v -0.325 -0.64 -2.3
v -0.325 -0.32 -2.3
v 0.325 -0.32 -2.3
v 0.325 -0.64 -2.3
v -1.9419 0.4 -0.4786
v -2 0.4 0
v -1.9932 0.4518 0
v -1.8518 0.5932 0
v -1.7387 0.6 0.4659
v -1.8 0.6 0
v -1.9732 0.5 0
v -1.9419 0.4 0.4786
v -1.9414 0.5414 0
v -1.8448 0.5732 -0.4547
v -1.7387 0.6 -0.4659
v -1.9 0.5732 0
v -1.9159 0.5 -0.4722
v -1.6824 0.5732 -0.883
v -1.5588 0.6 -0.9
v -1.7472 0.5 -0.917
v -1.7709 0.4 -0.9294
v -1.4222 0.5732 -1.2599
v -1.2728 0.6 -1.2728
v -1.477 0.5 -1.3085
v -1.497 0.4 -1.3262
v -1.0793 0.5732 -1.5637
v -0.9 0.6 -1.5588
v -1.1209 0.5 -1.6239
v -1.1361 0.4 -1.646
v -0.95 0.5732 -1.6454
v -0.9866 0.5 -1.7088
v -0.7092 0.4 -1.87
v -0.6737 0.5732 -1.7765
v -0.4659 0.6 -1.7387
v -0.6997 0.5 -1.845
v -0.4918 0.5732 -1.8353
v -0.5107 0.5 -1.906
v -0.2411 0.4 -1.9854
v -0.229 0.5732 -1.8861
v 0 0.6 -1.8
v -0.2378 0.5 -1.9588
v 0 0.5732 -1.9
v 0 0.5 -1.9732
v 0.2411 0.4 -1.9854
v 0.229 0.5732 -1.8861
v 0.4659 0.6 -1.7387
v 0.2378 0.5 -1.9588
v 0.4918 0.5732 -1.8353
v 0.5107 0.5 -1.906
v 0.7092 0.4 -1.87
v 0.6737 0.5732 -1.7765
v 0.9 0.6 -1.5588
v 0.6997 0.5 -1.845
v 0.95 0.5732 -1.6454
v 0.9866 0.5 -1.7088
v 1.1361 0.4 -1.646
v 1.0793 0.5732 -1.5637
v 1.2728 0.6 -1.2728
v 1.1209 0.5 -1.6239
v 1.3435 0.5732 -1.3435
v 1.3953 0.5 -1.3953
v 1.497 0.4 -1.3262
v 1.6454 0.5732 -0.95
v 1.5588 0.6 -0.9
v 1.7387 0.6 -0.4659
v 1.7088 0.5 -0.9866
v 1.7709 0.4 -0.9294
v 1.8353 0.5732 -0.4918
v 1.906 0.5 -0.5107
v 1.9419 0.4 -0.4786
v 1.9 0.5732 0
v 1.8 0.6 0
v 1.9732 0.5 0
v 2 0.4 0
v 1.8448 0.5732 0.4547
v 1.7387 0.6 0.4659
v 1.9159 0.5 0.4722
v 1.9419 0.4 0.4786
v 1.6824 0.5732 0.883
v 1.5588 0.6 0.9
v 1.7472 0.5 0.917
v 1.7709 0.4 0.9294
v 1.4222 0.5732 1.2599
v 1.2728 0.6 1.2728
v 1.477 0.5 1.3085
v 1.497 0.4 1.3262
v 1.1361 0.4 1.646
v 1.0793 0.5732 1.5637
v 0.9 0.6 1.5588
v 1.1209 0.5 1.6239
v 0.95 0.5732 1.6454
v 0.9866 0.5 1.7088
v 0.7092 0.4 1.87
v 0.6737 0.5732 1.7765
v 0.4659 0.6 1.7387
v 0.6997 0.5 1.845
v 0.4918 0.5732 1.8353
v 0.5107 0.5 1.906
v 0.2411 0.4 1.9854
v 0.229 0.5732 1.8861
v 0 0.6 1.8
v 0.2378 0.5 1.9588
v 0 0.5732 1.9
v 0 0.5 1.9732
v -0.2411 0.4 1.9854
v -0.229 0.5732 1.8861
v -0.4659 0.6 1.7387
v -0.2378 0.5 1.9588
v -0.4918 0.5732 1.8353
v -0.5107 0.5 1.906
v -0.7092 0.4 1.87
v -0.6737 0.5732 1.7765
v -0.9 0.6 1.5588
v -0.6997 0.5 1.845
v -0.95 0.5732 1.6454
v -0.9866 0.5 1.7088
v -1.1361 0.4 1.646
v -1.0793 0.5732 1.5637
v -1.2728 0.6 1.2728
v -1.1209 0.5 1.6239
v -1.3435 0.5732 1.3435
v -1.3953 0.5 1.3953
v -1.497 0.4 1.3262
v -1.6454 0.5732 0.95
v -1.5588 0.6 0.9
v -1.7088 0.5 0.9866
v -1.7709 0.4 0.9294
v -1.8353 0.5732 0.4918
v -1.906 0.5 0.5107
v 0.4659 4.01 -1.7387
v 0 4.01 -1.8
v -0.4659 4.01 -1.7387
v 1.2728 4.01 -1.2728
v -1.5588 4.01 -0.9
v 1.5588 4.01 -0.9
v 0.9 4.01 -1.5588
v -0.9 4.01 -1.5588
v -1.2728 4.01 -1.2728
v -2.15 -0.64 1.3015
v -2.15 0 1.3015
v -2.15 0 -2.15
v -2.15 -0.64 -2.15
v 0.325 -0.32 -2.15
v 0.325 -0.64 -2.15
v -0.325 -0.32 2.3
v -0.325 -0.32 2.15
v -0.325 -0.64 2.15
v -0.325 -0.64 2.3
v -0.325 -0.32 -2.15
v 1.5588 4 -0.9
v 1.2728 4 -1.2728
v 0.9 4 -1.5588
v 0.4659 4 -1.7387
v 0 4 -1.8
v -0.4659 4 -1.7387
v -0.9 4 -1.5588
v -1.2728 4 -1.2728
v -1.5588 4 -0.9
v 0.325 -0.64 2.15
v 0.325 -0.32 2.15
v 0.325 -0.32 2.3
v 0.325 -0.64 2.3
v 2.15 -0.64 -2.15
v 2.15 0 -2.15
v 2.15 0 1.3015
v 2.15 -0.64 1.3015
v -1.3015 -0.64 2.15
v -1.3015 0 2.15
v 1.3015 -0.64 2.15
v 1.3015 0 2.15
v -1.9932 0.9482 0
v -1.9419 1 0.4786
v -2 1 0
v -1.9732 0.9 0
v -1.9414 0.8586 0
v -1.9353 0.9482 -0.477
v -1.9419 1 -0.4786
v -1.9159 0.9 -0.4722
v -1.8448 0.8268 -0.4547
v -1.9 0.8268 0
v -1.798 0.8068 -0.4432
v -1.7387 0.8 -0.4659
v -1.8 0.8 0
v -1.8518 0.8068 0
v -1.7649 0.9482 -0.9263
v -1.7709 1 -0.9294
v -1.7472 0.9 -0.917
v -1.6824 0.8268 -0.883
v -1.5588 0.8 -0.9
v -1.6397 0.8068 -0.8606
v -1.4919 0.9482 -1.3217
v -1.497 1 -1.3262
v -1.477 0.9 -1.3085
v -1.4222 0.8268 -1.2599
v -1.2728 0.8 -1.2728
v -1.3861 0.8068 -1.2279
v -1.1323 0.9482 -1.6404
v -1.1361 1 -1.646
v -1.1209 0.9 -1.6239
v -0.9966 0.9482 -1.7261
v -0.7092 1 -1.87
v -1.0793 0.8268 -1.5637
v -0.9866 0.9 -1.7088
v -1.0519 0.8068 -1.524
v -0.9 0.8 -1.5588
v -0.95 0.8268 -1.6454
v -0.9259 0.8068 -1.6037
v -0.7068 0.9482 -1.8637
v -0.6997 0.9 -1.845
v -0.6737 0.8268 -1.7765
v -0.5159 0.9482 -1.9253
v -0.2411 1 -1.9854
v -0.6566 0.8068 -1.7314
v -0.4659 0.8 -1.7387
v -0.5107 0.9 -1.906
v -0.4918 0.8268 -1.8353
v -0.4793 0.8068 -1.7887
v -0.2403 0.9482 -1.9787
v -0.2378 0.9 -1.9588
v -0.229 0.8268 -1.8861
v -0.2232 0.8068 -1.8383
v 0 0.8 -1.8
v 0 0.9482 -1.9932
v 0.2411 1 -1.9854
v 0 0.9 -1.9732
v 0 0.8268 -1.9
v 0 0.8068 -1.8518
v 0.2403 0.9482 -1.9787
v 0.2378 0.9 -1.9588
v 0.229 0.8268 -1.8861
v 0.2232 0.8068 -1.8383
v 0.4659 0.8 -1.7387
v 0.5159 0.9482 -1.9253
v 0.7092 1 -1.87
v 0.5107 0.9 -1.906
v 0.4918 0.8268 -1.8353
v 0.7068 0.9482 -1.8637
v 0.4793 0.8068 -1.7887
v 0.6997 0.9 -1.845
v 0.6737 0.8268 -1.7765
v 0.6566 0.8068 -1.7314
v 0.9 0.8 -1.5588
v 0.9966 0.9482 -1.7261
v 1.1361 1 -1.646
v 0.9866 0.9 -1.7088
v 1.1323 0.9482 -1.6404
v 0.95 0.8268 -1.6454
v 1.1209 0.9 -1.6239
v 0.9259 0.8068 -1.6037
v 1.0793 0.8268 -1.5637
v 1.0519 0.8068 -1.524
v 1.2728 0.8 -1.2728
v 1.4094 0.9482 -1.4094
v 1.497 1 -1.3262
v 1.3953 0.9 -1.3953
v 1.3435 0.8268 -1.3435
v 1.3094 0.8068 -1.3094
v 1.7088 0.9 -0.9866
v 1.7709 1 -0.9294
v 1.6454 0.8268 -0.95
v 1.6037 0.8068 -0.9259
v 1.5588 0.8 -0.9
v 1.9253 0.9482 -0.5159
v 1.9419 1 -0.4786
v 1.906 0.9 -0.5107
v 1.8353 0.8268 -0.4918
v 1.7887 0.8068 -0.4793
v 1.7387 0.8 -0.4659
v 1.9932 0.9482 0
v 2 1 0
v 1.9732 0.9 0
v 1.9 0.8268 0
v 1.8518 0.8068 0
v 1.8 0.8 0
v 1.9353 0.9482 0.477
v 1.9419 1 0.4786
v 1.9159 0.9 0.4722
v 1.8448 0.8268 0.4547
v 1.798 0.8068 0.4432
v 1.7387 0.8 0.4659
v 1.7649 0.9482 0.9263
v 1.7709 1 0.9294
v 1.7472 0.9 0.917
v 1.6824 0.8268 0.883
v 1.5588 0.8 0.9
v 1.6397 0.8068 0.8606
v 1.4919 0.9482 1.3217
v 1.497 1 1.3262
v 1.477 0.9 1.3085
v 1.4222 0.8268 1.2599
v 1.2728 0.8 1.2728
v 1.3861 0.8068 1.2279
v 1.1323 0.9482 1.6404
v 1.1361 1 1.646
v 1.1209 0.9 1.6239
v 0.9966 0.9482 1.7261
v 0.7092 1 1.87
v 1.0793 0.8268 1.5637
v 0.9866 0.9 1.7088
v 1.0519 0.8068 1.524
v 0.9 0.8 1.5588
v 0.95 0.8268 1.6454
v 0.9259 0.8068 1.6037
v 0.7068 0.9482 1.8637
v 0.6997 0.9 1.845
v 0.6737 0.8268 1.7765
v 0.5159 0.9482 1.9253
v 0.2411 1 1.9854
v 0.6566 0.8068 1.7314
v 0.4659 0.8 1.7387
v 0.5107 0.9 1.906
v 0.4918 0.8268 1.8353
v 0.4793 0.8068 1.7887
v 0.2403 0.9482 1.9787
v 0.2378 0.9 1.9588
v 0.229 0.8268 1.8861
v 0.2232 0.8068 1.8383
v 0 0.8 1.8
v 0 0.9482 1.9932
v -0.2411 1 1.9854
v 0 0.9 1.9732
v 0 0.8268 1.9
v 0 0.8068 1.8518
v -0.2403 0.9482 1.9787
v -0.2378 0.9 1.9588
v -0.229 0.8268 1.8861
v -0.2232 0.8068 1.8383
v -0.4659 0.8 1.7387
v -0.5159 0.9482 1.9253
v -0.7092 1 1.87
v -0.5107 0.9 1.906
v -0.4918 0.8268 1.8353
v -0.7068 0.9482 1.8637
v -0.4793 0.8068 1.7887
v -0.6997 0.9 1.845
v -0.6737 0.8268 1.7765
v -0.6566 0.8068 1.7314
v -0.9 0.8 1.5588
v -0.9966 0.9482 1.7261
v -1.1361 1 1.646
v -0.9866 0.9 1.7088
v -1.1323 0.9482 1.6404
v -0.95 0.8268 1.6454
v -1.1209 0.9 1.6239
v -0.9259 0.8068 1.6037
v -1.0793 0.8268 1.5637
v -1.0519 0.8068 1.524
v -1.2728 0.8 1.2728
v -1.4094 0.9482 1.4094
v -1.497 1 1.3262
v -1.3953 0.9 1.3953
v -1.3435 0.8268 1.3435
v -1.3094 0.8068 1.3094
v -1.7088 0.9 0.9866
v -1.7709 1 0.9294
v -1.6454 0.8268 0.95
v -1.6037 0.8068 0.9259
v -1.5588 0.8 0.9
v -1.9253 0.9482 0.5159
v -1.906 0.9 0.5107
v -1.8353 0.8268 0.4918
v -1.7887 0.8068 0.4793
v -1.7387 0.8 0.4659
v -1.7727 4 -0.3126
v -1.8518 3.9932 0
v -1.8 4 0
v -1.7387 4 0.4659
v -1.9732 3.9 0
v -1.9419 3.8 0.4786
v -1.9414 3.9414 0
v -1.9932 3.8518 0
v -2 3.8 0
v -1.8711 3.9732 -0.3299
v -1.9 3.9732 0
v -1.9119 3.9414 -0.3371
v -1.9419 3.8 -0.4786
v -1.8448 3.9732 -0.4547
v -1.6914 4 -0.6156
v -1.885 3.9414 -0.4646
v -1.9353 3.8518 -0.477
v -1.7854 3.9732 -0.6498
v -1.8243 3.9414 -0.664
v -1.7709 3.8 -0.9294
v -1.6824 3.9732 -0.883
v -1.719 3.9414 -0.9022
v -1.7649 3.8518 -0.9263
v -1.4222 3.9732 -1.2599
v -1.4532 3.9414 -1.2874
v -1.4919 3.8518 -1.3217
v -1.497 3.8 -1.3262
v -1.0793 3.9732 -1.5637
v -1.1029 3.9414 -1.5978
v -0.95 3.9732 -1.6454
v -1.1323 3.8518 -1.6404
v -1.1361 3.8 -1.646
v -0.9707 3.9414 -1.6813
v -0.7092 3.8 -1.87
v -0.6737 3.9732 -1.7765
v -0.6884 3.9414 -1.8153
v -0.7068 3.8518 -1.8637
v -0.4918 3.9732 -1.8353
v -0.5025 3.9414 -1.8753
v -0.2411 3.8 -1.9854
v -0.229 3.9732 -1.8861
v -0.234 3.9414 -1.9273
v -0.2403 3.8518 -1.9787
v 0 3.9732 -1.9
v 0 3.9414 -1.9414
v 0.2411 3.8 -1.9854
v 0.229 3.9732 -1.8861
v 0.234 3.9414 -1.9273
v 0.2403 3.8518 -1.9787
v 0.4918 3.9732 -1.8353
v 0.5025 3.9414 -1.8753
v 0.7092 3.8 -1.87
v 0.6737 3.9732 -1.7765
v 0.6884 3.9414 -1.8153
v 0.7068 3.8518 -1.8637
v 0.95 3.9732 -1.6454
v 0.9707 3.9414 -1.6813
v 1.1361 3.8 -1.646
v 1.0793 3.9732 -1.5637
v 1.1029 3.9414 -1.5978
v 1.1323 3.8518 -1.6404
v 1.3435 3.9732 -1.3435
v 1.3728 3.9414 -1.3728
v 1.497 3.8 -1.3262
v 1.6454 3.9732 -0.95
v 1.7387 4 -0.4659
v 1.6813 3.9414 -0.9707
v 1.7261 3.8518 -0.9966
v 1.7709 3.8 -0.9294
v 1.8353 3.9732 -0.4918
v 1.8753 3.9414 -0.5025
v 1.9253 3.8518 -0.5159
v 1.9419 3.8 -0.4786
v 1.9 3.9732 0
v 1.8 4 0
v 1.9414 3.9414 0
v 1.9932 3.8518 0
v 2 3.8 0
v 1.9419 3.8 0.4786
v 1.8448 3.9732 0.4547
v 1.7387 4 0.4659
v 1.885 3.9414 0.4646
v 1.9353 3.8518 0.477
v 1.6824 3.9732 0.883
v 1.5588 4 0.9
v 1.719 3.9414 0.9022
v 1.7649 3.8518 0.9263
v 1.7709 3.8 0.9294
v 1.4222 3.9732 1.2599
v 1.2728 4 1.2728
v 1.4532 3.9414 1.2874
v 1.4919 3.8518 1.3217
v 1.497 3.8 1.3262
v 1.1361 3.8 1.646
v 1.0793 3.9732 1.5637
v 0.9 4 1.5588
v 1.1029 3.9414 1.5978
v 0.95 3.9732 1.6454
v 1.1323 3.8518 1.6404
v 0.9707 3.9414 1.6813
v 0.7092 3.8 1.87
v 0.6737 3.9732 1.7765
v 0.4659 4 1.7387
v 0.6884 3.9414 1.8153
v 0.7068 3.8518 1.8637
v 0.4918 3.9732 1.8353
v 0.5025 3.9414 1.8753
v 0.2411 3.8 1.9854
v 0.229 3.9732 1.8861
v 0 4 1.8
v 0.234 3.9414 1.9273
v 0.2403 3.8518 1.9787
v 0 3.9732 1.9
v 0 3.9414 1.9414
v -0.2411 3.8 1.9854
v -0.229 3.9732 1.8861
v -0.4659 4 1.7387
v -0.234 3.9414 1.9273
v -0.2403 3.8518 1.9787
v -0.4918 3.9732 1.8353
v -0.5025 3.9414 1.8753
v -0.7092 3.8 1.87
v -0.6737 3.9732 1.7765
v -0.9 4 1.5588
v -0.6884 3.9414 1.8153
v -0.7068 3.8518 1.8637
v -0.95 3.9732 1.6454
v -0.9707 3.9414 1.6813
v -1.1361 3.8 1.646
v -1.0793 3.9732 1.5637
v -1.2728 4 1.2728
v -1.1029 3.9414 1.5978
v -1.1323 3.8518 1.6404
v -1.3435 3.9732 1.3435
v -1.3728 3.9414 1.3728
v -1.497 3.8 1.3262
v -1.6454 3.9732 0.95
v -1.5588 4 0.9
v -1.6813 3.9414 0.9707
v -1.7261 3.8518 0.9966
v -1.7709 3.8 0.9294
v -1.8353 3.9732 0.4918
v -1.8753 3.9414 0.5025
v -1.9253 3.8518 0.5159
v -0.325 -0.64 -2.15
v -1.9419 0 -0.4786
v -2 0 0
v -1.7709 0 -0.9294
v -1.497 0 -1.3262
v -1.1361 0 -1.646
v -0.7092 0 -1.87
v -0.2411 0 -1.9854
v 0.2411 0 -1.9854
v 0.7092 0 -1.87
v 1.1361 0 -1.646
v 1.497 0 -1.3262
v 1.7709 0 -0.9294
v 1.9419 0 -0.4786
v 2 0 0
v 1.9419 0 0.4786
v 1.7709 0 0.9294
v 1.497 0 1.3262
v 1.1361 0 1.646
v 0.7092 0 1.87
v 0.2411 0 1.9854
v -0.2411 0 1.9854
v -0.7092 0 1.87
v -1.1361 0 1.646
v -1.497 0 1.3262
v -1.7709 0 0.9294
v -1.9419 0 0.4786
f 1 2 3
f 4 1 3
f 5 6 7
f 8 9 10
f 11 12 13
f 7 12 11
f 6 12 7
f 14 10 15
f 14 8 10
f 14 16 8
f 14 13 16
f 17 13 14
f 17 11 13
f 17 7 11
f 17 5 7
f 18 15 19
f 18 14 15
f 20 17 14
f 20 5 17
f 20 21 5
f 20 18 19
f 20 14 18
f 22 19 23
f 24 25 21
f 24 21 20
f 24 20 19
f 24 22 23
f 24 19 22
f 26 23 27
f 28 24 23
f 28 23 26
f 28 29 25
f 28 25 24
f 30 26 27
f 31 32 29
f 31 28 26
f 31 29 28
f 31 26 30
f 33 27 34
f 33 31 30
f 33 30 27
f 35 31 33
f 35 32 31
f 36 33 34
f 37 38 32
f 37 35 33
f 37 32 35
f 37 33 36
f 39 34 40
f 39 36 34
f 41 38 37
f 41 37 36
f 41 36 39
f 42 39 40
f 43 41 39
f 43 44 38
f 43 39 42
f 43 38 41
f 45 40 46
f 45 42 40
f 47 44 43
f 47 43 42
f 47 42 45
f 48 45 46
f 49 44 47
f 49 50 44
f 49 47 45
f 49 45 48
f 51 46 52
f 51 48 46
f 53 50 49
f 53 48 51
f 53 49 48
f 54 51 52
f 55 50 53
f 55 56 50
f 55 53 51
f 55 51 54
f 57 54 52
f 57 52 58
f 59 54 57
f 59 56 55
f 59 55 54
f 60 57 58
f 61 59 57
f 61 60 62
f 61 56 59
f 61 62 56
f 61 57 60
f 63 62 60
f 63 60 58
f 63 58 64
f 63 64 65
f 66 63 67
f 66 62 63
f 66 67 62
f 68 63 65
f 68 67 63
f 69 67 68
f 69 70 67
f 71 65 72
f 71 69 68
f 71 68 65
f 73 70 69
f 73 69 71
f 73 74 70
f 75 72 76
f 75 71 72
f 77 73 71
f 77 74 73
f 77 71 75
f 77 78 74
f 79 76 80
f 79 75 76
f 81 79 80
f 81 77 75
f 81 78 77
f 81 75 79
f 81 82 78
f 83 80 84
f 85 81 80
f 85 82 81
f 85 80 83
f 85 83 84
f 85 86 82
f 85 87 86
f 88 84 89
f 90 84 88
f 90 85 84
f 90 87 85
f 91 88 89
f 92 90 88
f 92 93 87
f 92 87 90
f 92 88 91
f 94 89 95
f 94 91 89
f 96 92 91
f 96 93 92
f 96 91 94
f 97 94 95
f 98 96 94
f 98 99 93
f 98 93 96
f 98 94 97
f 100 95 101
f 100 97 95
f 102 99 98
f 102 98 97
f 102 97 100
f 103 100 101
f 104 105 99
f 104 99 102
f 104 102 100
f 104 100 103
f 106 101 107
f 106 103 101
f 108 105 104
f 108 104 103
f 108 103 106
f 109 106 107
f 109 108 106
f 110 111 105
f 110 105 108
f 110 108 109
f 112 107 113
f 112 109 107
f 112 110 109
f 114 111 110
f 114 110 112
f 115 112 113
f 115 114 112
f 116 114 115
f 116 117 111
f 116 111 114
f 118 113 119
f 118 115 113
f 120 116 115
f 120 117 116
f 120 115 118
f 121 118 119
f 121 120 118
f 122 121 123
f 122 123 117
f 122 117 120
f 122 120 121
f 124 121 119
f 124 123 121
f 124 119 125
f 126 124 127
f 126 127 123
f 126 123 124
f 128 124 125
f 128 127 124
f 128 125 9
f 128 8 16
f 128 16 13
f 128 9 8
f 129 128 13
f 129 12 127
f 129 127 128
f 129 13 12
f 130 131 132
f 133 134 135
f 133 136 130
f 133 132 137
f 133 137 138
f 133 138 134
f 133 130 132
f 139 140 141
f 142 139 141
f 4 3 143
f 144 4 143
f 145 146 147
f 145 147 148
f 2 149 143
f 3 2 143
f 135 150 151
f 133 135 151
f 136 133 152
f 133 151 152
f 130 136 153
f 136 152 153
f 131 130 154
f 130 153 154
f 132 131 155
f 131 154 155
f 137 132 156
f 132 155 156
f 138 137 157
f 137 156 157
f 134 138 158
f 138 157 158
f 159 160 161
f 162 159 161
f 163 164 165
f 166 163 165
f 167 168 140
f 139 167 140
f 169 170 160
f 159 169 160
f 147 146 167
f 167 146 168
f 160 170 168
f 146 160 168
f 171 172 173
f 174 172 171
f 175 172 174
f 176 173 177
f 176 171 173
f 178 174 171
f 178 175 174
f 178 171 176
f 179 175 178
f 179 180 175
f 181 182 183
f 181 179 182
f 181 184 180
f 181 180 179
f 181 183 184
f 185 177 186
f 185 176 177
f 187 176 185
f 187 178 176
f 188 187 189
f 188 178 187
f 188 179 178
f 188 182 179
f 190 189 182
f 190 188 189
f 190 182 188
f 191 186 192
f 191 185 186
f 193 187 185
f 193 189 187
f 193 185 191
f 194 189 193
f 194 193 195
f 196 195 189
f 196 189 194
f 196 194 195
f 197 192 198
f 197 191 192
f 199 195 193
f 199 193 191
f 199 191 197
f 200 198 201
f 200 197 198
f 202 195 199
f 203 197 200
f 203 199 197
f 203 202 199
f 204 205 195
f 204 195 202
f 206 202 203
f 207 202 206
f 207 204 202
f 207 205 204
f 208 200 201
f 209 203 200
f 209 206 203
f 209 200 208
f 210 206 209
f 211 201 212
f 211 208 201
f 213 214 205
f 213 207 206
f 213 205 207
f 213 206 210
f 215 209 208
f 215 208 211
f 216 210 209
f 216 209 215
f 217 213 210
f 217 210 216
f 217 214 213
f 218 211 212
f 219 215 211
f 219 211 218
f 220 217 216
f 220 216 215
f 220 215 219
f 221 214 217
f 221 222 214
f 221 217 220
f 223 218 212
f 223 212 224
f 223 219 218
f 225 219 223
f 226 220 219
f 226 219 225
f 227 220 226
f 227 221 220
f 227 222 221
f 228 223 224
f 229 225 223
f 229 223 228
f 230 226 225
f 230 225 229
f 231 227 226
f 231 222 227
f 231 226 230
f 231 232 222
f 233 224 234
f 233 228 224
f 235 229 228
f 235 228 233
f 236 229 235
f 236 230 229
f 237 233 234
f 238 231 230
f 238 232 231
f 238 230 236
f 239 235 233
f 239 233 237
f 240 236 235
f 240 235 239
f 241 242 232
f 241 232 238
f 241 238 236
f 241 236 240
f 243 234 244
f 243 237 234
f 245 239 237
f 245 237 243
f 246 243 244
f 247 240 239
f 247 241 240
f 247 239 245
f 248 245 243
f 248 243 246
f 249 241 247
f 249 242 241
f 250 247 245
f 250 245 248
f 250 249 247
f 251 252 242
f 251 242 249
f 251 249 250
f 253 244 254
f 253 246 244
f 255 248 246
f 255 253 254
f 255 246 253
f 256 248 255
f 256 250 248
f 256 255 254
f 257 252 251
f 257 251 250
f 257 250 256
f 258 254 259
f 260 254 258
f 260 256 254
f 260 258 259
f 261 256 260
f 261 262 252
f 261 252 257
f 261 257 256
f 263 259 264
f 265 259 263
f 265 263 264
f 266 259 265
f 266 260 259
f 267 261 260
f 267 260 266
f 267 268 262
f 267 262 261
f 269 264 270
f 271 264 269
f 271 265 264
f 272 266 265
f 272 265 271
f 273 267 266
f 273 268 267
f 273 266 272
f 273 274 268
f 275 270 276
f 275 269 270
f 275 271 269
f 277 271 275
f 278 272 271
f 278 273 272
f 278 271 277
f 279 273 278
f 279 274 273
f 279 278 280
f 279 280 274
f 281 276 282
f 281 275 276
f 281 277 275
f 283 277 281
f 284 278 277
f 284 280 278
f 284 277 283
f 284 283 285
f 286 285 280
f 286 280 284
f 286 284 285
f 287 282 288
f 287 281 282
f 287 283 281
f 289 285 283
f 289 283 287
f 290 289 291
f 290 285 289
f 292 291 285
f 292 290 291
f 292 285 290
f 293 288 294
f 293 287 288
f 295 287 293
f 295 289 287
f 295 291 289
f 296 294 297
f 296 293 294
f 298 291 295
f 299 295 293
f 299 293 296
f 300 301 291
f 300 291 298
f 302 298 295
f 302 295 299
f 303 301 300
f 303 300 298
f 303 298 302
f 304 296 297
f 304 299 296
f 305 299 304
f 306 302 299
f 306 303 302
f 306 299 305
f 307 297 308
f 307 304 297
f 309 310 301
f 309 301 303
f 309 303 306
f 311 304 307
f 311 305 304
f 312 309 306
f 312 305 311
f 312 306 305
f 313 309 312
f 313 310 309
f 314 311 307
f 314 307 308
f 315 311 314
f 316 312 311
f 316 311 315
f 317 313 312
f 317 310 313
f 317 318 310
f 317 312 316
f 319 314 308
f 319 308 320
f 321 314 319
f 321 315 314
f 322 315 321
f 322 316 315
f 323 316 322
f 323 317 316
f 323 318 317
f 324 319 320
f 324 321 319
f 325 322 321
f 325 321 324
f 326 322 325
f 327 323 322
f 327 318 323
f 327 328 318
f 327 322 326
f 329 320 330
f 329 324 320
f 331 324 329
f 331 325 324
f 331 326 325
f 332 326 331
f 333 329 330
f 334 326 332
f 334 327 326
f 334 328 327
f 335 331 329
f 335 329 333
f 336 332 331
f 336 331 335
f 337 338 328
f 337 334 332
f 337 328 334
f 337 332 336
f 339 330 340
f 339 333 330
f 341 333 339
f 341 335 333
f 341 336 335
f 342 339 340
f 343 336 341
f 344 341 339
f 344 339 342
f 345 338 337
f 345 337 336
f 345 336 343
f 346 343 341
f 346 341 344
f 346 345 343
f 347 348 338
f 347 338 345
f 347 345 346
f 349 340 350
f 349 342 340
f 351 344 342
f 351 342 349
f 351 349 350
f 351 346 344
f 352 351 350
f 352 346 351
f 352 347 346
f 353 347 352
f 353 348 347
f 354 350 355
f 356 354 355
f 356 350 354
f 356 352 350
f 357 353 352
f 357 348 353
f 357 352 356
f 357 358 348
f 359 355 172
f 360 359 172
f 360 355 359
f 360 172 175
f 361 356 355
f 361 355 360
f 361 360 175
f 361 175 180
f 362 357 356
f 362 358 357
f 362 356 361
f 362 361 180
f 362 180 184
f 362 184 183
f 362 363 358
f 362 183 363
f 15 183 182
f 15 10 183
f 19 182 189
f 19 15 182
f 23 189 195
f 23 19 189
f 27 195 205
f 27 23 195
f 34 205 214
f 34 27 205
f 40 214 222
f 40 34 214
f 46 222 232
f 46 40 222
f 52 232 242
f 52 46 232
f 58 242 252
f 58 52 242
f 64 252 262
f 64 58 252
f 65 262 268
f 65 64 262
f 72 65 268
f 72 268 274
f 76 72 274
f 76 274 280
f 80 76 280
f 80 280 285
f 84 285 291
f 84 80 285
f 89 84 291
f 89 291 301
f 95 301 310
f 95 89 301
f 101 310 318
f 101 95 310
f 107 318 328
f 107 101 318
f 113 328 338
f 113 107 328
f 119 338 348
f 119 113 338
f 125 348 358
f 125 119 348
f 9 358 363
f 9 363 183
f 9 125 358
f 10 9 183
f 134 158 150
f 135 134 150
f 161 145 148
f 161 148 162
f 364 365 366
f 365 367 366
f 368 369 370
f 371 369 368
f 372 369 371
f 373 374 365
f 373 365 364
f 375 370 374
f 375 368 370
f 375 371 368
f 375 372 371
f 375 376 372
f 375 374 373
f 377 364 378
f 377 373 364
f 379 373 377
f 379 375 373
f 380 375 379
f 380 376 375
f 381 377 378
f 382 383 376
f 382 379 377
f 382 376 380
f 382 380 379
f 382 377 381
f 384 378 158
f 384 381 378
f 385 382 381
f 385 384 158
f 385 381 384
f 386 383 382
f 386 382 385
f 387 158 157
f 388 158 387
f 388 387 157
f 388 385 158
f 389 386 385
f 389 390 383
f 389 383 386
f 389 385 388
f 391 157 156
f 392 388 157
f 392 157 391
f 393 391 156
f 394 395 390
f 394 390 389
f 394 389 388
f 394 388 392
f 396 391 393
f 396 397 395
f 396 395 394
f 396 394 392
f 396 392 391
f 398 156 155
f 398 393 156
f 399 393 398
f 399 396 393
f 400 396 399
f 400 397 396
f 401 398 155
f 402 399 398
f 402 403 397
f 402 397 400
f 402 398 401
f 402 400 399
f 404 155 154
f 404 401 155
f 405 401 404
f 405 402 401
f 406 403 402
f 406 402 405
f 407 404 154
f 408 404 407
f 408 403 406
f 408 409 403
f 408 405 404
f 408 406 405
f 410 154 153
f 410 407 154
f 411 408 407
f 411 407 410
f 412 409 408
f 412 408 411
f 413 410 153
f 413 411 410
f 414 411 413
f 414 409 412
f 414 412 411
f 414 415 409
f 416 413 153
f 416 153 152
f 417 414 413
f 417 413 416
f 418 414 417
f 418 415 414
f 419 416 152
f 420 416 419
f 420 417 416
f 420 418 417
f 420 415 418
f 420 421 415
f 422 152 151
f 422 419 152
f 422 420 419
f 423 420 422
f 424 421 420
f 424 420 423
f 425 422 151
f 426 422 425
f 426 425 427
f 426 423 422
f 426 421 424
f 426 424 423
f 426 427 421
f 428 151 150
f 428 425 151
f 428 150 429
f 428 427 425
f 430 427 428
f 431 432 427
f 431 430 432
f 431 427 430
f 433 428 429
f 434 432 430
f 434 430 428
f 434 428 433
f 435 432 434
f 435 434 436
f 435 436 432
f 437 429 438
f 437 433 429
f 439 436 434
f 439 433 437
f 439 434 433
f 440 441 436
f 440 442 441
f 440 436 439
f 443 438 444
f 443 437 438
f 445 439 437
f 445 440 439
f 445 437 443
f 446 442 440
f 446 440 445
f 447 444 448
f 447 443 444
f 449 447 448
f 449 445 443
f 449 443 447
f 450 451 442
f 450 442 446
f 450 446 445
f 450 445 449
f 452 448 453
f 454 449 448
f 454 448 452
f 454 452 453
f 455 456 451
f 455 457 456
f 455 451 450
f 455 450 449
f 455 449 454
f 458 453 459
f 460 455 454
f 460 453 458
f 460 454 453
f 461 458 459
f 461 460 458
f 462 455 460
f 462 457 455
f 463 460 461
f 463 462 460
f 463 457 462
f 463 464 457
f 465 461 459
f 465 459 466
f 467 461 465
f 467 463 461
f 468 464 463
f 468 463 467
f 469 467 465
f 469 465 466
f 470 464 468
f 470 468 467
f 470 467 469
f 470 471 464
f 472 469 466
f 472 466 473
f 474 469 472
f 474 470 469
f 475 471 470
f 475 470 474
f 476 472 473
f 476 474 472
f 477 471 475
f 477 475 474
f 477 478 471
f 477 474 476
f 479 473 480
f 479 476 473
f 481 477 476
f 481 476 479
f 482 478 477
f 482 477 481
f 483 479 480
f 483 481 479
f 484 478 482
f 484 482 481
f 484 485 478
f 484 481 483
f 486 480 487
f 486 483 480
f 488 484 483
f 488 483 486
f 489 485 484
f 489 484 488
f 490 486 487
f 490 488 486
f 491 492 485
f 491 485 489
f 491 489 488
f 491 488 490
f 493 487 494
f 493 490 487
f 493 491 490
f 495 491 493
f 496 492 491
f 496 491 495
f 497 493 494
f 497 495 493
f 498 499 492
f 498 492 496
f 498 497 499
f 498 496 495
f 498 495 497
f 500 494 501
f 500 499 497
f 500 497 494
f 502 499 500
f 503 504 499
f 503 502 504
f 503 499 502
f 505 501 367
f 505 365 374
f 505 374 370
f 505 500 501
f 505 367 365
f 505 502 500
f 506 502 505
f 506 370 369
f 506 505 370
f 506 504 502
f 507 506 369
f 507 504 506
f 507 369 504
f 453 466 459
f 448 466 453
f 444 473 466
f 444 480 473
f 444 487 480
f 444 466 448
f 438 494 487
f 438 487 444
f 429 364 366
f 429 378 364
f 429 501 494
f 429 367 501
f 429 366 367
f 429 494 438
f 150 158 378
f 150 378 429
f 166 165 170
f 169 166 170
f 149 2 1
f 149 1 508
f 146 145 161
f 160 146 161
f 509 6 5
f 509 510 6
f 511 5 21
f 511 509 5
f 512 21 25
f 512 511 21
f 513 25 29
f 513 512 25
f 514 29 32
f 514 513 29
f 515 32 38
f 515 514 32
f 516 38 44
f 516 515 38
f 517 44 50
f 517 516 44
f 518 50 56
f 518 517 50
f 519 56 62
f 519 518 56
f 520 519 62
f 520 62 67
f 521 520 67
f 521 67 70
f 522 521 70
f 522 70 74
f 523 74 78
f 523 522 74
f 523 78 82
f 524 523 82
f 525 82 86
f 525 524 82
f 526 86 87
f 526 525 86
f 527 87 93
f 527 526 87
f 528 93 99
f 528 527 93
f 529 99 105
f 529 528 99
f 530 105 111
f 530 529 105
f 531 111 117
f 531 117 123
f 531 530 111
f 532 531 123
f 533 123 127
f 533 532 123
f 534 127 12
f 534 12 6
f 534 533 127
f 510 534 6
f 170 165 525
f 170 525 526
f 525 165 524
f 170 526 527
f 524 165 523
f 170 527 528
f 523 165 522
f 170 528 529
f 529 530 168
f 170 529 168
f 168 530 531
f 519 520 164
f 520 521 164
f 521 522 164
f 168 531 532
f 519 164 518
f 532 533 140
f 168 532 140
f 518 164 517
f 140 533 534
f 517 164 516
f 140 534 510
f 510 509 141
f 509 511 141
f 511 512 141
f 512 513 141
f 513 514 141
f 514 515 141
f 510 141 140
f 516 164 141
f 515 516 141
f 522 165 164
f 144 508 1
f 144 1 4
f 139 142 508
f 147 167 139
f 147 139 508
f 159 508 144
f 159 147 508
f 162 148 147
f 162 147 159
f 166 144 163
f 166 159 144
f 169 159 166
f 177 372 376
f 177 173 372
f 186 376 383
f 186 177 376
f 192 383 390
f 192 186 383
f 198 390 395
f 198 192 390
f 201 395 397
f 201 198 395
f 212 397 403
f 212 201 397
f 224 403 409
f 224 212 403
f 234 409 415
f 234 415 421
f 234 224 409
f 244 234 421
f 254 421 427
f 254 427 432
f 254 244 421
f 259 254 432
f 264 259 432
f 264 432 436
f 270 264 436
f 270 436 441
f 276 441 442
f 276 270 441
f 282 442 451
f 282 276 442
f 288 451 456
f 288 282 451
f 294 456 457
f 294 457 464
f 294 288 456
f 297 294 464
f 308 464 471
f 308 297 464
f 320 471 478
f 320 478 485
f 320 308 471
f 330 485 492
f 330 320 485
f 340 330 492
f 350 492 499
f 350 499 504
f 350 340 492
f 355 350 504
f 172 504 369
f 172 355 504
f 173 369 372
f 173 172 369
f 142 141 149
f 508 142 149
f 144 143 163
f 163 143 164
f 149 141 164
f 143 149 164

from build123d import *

# Parameters (mm, degrees)
BOSS_EXTRUDE1_DEPTH = 0.01
BOSS_EXTRUDE2_DEPTH = 0.64
CUT_EXTRUDE1_START  = 0.64
CUT_EXTRUDE1_DEPTH  = 0.32
SKETCH4_W           = 0.65
SKETCH4_H           = 1.8
BOSS_EXTRUDE3_DEPTH = 0.32


with BuildPart() as part:
    # Sketch1 → Revolve1 (revolve)
    with BuildSketch(Plane.XY):
        with BuildLine():
            Line((0, 4), (-1.8, 4))
            ThreePointArc((-1.8, 4), (-1.941421356, 3.941421356), (-2, 3.8))
            Line((-2, 3.8), (-2, 1))
            ThreePointArc((-2, 1), (-1.941421356, 0.858578644), (-1.8, 0.8))
            Line((-1.8, 0.8), (-1.8, 0.6))
            ThreePointArc((-1.8, 0.6), (-1.941421356, 0.541421356), (-2, 0.4))
            Line((-2, 0.4), (-2, 0))
            Line((-2, 0), (0, 0))
            Line((0, 0), (0, 4))
        make_face()
    revolve(axis=Axis((0, 8.082229881, 0), (0, -1, 0)))

    # Sketch2 → Boss-Extrude1 (add)
    with BuildSketch(Plane(origin=(0, 4, 0), x_dir=(1, 0, 0), z_dir=(0, 1, 0))):
        with BuildLine():
            Line((-1.558845727, 0.9), (1.558845727, 0.9))
            ThreePointArc((1.558845727, 0.9), (0, 1.8), (-1.558845727, 0.9))
        make_face()
    extrude(amount=BOSS_EXTRUDE1_DEPTH)

    # Sketch3 → Boss-Extrude2 (add)
    with BuildSketch(Plane(origin=(0, 0, 0), x_dir=(-1, 0, 0), z_dir=(0, -1, 0))):
        Polygon((1.301471863, -2.15), (2.15, -1.301471863), (2.15, 2.15), (-2.15, 2.15), (-2.15, -1.301471863), (-1.301471863, -2.15), align=None)
    extrude(amount=BOSS_EXTRUDE2_DEPTH)

    # Sketch3<3> → Cut-Extrude1 (cut)
    with BuildSketch(Plane(origin=(0, 0, 0), x_dir=(-1, 0, 0), z_dir=(0, -1, 0)).offset(CUT_EXTRUDE1_START)):
        with BuildLine():
            Line((0.325, 0.5), (0.325, 1.973417087))
            ThreePointArc((0.325, 1.973417087), (0, 2), (-0.325, 1.973417087))
            Line((-0.325, 1.973417087), (-0.325, 0.5))
            Line((-0.325, 0.5), (0.325, 0.5))
        make_face()
        with BuildLine():
            ThreePointArc((-0.325, -1.973417087), (0, -2), (0.325, -1.973417087))
            Line((0.325, -1.973417087), (0.325, -0.5))
            Line((0.325, -0.5), (-0.325, -0.5))
            Line((-0.325, -0.5), (-0.325, -1.973417087))
        make_face()
        with BuildLine():
            Line((0.325, 1.973417087), (0.325, 2.15))
            Line((0.325, 2.15), (-0.325, 2.15))
            Line((-0.325, 2.15), (-0.325, 1.973417087))
            ThreePointArc((-0.325, 1.973417087), (0, 2), (0.325, 1.973417087))
        make_face()
        with BuildLine():
            Line((-0.325, -2.15), (0.325, -2.15))
            Line((0.325, -2.15), (0.325, -1.973417087))
            ThreePointArc((0.325, -1.973417087), (0, -2), (-0.325, -1.973417087))
            Line((-0.325, -1.973417087), (-0.325, -2.15))
        make_face()
    extrude(amount=-CUT_EXTRUDE1_DEPTH, mode=Mode.SUBTRACT)

    # Sketch4 → Boss-Extrude3 (add)
    with BuildSketch(Plane.XZ.offset(0.32)):
        with Locations((0, -1.4)):
            Rectangle(SKETCH4_W, SKETCH4_H)
        with Locations((0, 1.4)):
            Rectangle(SKETCH4_W, SKETCH4_H)
    extrude(amount=BOSS_EXTRUDE3_DEPTH)


solid = part.part
